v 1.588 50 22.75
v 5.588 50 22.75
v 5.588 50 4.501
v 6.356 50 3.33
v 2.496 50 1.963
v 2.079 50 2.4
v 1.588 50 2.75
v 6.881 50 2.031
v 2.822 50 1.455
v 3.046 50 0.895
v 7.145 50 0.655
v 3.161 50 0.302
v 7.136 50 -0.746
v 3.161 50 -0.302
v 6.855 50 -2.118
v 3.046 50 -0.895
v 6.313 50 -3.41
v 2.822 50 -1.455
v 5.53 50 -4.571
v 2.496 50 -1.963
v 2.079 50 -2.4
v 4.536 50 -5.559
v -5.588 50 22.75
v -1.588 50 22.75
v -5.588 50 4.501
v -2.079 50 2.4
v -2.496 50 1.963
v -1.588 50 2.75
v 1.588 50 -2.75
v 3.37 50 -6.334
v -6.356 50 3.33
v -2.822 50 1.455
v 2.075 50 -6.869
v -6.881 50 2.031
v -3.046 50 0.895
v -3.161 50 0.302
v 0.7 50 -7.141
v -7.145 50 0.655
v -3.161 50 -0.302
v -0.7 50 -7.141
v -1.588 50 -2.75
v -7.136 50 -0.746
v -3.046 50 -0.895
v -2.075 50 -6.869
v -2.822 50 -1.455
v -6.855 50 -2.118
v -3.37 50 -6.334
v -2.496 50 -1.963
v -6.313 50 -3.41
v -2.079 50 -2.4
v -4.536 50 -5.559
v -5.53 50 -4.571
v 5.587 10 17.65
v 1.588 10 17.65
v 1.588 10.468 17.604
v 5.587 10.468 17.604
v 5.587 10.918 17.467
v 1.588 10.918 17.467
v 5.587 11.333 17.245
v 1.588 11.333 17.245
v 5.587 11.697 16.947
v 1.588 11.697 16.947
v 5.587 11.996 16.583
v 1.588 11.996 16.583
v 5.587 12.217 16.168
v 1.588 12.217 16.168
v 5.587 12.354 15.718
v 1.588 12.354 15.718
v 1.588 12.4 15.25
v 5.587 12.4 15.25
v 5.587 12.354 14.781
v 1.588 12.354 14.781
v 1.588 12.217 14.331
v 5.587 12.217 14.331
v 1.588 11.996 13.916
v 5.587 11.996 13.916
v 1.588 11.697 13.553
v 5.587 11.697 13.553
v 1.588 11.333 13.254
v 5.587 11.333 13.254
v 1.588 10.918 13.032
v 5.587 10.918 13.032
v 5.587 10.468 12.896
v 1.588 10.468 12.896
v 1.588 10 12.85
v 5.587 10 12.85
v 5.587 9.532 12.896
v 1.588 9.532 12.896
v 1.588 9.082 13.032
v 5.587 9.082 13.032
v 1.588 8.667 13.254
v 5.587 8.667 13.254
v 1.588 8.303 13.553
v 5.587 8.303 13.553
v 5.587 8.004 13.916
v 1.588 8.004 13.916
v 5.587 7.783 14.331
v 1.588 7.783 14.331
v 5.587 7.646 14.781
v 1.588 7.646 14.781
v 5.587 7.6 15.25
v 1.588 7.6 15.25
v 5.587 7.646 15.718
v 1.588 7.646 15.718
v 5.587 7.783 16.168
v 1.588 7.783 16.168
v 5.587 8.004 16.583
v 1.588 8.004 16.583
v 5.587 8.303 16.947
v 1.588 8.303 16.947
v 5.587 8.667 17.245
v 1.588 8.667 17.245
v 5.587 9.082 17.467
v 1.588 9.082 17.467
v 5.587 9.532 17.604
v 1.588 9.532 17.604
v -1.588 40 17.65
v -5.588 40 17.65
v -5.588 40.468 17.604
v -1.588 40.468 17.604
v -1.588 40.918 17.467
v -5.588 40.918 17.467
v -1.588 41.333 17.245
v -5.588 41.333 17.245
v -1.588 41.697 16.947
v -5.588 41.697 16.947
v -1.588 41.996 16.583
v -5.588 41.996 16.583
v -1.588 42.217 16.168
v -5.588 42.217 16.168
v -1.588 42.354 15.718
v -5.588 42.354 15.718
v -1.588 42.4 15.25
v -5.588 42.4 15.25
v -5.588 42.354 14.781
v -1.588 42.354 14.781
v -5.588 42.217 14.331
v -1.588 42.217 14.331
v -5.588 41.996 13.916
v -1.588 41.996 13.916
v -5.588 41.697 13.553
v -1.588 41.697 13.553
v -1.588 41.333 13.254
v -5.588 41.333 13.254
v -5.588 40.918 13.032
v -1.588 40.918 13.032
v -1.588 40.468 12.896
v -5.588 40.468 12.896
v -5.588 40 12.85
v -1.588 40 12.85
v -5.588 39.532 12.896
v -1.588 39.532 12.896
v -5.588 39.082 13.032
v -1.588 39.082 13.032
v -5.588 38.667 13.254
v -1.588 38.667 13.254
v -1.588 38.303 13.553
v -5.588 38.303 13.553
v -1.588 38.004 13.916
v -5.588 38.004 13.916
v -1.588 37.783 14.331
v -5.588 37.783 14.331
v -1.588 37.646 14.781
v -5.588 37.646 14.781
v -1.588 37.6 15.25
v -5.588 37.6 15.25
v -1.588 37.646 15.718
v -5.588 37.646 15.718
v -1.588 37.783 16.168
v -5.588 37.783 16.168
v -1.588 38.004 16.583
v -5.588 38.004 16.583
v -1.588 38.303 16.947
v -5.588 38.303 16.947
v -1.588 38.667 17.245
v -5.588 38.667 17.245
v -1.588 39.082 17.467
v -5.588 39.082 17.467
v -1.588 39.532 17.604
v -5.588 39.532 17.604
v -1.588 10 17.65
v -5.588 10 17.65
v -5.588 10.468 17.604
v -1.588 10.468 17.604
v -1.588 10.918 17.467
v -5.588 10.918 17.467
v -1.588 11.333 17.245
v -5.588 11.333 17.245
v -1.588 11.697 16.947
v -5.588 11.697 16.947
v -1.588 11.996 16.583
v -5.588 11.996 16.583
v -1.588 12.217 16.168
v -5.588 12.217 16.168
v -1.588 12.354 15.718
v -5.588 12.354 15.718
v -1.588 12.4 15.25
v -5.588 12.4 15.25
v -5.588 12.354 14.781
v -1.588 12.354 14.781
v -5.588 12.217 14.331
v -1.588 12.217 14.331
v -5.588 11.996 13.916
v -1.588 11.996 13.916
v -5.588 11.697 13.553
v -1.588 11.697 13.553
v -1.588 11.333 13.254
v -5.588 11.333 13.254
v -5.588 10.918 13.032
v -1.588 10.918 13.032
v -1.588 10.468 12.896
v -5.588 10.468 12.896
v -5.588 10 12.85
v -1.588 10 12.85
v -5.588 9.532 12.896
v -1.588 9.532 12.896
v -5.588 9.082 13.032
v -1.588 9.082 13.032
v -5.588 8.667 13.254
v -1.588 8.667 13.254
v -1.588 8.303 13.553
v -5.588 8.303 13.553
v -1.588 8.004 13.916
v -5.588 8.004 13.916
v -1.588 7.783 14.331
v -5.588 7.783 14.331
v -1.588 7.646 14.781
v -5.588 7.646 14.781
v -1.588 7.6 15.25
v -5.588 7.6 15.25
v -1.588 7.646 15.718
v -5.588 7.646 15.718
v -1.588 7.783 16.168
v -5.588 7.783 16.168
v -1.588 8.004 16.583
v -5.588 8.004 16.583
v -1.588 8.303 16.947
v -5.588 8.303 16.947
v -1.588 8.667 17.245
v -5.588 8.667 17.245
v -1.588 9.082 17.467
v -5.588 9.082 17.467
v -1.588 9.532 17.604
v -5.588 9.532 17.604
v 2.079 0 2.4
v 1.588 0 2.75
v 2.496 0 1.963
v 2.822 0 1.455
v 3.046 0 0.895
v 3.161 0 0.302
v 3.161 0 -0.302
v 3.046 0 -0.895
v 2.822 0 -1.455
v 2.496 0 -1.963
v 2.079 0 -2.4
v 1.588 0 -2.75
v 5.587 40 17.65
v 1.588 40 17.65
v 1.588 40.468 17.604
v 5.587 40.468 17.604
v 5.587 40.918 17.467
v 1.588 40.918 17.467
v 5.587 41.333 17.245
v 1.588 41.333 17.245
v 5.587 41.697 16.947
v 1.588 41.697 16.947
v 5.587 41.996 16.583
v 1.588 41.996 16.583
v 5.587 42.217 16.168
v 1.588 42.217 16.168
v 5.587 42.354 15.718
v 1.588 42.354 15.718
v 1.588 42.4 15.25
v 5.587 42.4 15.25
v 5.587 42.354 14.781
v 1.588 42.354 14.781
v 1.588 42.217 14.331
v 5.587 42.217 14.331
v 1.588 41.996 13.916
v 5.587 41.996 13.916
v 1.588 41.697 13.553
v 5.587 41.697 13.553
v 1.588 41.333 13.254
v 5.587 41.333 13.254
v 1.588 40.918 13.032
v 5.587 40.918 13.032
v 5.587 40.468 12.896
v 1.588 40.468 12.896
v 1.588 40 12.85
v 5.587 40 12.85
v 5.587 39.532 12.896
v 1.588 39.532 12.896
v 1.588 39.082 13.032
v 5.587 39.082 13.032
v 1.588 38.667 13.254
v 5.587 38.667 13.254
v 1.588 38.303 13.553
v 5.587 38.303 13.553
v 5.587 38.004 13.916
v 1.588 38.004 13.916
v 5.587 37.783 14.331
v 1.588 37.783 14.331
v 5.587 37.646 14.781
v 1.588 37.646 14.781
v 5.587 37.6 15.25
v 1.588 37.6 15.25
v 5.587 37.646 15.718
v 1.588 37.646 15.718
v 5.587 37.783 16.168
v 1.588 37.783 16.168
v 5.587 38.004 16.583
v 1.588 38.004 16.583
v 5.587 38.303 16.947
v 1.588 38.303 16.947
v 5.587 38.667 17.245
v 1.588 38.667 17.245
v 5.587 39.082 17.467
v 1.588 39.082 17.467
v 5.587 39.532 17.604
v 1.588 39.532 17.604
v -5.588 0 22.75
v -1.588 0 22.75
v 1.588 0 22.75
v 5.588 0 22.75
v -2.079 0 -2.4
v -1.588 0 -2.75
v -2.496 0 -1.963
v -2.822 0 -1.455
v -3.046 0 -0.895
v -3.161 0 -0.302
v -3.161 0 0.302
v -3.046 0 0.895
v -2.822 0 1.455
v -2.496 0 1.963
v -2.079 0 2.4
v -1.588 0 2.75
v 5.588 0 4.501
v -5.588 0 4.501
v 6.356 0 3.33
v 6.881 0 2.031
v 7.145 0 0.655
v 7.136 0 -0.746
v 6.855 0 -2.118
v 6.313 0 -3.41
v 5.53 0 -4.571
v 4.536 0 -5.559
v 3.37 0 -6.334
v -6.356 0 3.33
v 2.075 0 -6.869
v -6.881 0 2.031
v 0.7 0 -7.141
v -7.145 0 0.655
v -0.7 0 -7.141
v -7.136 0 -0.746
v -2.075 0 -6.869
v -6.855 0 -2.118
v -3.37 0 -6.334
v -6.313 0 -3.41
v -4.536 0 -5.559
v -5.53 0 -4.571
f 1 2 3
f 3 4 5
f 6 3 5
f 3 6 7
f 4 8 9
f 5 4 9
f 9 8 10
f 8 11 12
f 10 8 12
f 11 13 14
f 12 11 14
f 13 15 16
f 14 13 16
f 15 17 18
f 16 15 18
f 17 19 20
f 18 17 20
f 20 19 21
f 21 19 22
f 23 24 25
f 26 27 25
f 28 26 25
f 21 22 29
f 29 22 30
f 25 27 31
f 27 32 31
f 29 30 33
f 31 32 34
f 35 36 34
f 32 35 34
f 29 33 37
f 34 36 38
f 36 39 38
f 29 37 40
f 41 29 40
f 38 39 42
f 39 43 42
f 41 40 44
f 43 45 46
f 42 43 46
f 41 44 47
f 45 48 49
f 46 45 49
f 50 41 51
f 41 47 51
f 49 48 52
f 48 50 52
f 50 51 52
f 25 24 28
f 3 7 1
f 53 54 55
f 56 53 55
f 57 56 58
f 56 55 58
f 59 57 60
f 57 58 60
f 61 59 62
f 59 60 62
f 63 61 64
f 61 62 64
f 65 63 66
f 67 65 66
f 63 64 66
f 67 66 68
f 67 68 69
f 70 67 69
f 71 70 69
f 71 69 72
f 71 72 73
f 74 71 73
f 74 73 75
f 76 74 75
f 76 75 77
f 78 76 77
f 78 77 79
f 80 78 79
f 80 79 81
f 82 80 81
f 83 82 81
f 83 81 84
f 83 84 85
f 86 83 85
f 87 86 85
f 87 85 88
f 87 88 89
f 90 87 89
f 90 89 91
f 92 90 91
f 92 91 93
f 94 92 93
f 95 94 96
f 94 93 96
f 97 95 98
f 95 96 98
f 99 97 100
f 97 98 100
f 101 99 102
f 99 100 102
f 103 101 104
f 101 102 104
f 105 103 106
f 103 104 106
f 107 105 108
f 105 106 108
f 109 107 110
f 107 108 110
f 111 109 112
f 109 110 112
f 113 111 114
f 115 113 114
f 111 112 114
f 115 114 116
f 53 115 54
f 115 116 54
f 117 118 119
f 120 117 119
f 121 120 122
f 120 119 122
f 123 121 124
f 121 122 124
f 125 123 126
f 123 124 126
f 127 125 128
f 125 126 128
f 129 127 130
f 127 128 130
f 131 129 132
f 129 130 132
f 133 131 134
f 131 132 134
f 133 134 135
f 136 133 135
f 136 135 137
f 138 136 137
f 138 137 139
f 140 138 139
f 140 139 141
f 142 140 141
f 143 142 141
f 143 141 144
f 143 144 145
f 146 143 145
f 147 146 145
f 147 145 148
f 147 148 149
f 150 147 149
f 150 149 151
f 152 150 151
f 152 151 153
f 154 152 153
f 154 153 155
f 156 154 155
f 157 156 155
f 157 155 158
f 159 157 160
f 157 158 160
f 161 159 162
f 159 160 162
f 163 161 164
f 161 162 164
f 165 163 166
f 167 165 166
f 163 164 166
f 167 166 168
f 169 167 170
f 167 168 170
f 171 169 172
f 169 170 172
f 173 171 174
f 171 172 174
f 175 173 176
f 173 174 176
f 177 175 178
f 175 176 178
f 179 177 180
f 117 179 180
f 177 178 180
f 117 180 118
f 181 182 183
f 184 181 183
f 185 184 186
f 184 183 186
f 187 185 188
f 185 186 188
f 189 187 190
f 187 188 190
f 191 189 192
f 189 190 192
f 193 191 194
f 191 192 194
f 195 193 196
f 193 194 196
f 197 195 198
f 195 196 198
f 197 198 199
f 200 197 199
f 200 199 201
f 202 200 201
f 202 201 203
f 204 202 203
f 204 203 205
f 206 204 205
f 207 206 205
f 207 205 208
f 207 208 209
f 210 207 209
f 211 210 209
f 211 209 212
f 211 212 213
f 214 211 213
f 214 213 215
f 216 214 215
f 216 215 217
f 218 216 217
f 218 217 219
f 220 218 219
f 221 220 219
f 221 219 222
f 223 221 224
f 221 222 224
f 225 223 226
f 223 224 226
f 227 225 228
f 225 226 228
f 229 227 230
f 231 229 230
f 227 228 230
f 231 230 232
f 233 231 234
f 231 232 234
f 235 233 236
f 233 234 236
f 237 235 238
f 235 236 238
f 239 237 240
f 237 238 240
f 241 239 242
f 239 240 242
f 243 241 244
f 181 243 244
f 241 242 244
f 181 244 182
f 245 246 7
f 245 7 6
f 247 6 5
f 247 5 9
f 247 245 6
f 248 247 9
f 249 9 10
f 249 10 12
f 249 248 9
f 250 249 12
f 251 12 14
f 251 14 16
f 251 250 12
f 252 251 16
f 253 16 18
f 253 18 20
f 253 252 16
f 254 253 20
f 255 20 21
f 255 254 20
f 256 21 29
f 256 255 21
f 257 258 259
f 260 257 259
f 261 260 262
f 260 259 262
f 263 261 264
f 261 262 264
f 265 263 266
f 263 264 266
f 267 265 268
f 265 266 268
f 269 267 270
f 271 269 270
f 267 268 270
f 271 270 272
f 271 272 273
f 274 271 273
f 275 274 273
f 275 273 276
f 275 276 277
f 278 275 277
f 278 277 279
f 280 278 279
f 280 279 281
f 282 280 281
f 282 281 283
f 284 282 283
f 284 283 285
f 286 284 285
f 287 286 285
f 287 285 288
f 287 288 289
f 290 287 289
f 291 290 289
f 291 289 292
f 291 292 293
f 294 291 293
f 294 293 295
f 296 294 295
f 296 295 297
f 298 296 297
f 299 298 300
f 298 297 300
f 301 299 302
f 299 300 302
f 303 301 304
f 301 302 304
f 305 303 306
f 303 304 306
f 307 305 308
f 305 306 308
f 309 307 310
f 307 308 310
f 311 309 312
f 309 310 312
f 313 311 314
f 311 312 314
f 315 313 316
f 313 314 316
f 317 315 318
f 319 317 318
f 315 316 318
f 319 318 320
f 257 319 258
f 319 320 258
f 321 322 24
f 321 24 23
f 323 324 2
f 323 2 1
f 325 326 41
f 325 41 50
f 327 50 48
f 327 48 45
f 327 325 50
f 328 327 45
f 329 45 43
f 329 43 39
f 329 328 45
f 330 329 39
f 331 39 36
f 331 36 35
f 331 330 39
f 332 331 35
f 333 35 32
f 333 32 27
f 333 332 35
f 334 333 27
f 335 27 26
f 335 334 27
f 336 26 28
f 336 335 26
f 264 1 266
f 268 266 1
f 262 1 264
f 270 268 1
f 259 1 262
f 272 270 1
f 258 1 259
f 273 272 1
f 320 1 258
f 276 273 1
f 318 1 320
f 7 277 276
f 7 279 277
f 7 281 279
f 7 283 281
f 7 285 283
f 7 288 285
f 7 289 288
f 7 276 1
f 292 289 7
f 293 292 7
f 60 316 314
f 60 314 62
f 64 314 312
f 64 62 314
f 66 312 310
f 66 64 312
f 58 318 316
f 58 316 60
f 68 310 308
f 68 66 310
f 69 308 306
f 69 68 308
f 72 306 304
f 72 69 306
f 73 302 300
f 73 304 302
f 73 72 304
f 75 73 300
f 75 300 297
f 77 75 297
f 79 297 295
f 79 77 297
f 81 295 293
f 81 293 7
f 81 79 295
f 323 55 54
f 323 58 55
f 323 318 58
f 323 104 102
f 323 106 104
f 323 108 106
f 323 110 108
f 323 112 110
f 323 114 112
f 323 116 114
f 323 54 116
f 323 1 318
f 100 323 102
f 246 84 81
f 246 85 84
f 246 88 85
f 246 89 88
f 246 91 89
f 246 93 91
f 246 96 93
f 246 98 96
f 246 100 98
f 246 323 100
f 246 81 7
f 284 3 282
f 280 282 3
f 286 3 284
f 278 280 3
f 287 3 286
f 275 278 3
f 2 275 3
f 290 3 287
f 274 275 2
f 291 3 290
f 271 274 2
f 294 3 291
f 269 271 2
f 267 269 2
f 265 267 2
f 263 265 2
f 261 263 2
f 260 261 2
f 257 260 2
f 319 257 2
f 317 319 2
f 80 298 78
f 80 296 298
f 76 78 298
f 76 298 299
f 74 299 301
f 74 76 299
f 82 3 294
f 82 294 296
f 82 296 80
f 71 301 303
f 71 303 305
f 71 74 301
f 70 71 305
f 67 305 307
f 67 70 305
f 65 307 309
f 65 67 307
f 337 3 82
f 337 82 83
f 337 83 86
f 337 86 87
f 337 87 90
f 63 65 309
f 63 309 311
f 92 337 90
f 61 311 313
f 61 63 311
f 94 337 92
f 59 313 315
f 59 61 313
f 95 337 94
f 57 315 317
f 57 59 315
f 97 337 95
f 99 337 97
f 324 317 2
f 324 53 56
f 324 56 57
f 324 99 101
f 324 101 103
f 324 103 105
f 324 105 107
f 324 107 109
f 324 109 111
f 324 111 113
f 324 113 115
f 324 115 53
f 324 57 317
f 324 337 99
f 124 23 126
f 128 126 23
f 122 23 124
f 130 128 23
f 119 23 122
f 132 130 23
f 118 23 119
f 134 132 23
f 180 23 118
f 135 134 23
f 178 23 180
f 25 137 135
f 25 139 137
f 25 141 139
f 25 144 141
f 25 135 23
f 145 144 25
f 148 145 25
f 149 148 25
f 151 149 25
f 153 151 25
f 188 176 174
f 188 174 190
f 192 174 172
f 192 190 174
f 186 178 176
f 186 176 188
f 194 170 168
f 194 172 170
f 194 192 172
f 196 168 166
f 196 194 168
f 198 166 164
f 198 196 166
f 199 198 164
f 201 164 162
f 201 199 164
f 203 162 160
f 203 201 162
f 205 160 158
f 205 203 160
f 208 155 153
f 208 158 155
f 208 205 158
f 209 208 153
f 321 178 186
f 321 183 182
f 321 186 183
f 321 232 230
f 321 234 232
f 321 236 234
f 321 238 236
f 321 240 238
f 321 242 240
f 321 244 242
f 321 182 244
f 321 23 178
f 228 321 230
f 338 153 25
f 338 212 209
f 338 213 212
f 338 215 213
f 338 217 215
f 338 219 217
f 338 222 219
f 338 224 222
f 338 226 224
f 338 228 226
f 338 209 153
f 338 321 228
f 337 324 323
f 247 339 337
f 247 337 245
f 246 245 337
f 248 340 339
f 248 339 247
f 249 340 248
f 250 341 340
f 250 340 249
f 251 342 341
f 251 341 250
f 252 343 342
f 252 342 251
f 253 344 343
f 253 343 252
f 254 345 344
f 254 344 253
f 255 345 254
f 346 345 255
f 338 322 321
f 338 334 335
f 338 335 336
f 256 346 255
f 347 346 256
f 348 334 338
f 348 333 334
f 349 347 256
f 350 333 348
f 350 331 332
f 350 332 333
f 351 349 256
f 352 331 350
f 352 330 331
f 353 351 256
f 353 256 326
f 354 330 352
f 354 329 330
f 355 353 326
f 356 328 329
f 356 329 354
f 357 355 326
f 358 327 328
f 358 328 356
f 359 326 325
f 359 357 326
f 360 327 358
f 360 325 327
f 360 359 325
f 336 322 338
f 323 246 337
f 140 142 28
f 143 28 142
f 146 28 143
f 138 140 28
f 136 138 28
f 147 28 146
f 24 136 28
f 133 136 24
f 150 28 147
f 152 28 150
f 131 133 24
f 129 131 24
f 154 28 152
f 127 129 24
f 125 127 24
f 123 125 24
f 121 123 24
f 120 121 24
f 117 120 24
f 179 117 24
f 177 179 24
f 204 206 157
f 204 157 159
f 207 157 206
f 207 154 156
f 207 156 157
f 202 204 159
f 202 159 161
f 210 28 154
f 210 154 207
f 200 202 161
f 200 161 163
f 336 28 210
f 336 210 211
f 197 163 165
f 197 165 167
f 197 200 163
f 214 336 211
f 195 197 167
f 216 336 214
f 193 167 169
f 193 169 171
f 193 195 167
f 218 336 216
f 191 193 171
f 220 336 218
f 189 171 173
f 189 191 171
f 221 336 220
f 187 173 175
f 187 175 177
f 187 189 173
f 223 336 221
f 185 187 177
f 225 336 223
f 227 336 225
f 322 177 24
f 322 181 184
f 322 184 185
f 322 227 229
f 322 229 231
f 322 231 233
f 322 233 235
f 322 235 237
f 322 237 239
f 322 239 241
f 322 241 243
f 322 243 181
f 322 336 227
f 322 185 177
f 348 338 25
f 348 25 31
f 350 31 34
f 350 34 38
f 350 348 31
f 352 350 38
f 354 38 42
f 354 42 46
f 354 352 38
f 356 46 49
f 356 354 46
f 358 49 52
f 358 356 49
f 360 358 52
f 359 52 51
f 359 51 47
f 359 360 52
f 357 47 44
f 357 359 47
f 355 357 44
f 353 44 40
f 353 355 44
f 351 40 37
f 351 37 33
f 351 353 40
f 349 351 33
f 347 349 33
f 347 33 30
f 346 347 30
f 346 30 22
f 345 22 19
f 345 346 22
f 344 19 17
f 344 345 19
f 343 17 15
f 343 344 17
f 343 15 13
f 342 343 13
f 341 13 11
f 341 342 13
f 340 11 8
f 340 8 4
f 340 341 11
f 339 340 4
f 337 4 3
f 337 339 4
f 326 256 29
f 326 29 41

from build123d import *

# Parameters (mm, degrees)
BOSS_EXTRUDE1_DEPTH  = 50
M4_CLEARANCE_HOLE1_D = 4.8


with BuildPart() as part:
    # Sketch1 → Boss-Extrude1 (new body)
    with BuildSketch(Plane(origin=(0, 0, 0), x_dir=(1, 0, 0), z_dir=(0, 1, 0))):
        with BuildLine():
            Line((-1.5875, -2.749630657), (-1.5875, -22.749630657))
            Line((-1.5875, -22.749630657), (-5.5875, -22.749630657))
            Line((-5.5875, -22.749630657), (-5.5875, -4.501163044))
            ThreePointArc((-5.5875, -4.501163044), (0, 7.175), (5.5875, -4.501163044))
            Line((5.5875, -4.501163044), (5.5875, -22.749630657))
            Line((5.5875, -22.749630657), (1.5875, -22.749630657))
            Line((1.5875, -22.749630657), (1.5875, -2.749630657))
            ThreePointArc((1.5875, -2.749630657), (3.175, 0), (1.5875, 2.749630657))
            Line((1.5875, 2.749630657), (-1.5875, 2.749630657))
            ThreePointArc((-1.5875, 2.749630657), (-3.175, 0), (-1.5875, -2.749630657))
        make_face()
    extrude(amount=BOSS_EXTRUDE1_DEPTH)

    # M4 Clearance Hole1 (through all)
    with Locations(Plane(origin=(5.5875, 0, 0), x_dir=(0, 0, -1), z_dir=(1, 0, 0))):
        with Locations((-15.249630657, 40), (-15.249630657, 10)):
            Hole(M4_CLEARANCE_HOLE1_D / 2)


solid = part.part
